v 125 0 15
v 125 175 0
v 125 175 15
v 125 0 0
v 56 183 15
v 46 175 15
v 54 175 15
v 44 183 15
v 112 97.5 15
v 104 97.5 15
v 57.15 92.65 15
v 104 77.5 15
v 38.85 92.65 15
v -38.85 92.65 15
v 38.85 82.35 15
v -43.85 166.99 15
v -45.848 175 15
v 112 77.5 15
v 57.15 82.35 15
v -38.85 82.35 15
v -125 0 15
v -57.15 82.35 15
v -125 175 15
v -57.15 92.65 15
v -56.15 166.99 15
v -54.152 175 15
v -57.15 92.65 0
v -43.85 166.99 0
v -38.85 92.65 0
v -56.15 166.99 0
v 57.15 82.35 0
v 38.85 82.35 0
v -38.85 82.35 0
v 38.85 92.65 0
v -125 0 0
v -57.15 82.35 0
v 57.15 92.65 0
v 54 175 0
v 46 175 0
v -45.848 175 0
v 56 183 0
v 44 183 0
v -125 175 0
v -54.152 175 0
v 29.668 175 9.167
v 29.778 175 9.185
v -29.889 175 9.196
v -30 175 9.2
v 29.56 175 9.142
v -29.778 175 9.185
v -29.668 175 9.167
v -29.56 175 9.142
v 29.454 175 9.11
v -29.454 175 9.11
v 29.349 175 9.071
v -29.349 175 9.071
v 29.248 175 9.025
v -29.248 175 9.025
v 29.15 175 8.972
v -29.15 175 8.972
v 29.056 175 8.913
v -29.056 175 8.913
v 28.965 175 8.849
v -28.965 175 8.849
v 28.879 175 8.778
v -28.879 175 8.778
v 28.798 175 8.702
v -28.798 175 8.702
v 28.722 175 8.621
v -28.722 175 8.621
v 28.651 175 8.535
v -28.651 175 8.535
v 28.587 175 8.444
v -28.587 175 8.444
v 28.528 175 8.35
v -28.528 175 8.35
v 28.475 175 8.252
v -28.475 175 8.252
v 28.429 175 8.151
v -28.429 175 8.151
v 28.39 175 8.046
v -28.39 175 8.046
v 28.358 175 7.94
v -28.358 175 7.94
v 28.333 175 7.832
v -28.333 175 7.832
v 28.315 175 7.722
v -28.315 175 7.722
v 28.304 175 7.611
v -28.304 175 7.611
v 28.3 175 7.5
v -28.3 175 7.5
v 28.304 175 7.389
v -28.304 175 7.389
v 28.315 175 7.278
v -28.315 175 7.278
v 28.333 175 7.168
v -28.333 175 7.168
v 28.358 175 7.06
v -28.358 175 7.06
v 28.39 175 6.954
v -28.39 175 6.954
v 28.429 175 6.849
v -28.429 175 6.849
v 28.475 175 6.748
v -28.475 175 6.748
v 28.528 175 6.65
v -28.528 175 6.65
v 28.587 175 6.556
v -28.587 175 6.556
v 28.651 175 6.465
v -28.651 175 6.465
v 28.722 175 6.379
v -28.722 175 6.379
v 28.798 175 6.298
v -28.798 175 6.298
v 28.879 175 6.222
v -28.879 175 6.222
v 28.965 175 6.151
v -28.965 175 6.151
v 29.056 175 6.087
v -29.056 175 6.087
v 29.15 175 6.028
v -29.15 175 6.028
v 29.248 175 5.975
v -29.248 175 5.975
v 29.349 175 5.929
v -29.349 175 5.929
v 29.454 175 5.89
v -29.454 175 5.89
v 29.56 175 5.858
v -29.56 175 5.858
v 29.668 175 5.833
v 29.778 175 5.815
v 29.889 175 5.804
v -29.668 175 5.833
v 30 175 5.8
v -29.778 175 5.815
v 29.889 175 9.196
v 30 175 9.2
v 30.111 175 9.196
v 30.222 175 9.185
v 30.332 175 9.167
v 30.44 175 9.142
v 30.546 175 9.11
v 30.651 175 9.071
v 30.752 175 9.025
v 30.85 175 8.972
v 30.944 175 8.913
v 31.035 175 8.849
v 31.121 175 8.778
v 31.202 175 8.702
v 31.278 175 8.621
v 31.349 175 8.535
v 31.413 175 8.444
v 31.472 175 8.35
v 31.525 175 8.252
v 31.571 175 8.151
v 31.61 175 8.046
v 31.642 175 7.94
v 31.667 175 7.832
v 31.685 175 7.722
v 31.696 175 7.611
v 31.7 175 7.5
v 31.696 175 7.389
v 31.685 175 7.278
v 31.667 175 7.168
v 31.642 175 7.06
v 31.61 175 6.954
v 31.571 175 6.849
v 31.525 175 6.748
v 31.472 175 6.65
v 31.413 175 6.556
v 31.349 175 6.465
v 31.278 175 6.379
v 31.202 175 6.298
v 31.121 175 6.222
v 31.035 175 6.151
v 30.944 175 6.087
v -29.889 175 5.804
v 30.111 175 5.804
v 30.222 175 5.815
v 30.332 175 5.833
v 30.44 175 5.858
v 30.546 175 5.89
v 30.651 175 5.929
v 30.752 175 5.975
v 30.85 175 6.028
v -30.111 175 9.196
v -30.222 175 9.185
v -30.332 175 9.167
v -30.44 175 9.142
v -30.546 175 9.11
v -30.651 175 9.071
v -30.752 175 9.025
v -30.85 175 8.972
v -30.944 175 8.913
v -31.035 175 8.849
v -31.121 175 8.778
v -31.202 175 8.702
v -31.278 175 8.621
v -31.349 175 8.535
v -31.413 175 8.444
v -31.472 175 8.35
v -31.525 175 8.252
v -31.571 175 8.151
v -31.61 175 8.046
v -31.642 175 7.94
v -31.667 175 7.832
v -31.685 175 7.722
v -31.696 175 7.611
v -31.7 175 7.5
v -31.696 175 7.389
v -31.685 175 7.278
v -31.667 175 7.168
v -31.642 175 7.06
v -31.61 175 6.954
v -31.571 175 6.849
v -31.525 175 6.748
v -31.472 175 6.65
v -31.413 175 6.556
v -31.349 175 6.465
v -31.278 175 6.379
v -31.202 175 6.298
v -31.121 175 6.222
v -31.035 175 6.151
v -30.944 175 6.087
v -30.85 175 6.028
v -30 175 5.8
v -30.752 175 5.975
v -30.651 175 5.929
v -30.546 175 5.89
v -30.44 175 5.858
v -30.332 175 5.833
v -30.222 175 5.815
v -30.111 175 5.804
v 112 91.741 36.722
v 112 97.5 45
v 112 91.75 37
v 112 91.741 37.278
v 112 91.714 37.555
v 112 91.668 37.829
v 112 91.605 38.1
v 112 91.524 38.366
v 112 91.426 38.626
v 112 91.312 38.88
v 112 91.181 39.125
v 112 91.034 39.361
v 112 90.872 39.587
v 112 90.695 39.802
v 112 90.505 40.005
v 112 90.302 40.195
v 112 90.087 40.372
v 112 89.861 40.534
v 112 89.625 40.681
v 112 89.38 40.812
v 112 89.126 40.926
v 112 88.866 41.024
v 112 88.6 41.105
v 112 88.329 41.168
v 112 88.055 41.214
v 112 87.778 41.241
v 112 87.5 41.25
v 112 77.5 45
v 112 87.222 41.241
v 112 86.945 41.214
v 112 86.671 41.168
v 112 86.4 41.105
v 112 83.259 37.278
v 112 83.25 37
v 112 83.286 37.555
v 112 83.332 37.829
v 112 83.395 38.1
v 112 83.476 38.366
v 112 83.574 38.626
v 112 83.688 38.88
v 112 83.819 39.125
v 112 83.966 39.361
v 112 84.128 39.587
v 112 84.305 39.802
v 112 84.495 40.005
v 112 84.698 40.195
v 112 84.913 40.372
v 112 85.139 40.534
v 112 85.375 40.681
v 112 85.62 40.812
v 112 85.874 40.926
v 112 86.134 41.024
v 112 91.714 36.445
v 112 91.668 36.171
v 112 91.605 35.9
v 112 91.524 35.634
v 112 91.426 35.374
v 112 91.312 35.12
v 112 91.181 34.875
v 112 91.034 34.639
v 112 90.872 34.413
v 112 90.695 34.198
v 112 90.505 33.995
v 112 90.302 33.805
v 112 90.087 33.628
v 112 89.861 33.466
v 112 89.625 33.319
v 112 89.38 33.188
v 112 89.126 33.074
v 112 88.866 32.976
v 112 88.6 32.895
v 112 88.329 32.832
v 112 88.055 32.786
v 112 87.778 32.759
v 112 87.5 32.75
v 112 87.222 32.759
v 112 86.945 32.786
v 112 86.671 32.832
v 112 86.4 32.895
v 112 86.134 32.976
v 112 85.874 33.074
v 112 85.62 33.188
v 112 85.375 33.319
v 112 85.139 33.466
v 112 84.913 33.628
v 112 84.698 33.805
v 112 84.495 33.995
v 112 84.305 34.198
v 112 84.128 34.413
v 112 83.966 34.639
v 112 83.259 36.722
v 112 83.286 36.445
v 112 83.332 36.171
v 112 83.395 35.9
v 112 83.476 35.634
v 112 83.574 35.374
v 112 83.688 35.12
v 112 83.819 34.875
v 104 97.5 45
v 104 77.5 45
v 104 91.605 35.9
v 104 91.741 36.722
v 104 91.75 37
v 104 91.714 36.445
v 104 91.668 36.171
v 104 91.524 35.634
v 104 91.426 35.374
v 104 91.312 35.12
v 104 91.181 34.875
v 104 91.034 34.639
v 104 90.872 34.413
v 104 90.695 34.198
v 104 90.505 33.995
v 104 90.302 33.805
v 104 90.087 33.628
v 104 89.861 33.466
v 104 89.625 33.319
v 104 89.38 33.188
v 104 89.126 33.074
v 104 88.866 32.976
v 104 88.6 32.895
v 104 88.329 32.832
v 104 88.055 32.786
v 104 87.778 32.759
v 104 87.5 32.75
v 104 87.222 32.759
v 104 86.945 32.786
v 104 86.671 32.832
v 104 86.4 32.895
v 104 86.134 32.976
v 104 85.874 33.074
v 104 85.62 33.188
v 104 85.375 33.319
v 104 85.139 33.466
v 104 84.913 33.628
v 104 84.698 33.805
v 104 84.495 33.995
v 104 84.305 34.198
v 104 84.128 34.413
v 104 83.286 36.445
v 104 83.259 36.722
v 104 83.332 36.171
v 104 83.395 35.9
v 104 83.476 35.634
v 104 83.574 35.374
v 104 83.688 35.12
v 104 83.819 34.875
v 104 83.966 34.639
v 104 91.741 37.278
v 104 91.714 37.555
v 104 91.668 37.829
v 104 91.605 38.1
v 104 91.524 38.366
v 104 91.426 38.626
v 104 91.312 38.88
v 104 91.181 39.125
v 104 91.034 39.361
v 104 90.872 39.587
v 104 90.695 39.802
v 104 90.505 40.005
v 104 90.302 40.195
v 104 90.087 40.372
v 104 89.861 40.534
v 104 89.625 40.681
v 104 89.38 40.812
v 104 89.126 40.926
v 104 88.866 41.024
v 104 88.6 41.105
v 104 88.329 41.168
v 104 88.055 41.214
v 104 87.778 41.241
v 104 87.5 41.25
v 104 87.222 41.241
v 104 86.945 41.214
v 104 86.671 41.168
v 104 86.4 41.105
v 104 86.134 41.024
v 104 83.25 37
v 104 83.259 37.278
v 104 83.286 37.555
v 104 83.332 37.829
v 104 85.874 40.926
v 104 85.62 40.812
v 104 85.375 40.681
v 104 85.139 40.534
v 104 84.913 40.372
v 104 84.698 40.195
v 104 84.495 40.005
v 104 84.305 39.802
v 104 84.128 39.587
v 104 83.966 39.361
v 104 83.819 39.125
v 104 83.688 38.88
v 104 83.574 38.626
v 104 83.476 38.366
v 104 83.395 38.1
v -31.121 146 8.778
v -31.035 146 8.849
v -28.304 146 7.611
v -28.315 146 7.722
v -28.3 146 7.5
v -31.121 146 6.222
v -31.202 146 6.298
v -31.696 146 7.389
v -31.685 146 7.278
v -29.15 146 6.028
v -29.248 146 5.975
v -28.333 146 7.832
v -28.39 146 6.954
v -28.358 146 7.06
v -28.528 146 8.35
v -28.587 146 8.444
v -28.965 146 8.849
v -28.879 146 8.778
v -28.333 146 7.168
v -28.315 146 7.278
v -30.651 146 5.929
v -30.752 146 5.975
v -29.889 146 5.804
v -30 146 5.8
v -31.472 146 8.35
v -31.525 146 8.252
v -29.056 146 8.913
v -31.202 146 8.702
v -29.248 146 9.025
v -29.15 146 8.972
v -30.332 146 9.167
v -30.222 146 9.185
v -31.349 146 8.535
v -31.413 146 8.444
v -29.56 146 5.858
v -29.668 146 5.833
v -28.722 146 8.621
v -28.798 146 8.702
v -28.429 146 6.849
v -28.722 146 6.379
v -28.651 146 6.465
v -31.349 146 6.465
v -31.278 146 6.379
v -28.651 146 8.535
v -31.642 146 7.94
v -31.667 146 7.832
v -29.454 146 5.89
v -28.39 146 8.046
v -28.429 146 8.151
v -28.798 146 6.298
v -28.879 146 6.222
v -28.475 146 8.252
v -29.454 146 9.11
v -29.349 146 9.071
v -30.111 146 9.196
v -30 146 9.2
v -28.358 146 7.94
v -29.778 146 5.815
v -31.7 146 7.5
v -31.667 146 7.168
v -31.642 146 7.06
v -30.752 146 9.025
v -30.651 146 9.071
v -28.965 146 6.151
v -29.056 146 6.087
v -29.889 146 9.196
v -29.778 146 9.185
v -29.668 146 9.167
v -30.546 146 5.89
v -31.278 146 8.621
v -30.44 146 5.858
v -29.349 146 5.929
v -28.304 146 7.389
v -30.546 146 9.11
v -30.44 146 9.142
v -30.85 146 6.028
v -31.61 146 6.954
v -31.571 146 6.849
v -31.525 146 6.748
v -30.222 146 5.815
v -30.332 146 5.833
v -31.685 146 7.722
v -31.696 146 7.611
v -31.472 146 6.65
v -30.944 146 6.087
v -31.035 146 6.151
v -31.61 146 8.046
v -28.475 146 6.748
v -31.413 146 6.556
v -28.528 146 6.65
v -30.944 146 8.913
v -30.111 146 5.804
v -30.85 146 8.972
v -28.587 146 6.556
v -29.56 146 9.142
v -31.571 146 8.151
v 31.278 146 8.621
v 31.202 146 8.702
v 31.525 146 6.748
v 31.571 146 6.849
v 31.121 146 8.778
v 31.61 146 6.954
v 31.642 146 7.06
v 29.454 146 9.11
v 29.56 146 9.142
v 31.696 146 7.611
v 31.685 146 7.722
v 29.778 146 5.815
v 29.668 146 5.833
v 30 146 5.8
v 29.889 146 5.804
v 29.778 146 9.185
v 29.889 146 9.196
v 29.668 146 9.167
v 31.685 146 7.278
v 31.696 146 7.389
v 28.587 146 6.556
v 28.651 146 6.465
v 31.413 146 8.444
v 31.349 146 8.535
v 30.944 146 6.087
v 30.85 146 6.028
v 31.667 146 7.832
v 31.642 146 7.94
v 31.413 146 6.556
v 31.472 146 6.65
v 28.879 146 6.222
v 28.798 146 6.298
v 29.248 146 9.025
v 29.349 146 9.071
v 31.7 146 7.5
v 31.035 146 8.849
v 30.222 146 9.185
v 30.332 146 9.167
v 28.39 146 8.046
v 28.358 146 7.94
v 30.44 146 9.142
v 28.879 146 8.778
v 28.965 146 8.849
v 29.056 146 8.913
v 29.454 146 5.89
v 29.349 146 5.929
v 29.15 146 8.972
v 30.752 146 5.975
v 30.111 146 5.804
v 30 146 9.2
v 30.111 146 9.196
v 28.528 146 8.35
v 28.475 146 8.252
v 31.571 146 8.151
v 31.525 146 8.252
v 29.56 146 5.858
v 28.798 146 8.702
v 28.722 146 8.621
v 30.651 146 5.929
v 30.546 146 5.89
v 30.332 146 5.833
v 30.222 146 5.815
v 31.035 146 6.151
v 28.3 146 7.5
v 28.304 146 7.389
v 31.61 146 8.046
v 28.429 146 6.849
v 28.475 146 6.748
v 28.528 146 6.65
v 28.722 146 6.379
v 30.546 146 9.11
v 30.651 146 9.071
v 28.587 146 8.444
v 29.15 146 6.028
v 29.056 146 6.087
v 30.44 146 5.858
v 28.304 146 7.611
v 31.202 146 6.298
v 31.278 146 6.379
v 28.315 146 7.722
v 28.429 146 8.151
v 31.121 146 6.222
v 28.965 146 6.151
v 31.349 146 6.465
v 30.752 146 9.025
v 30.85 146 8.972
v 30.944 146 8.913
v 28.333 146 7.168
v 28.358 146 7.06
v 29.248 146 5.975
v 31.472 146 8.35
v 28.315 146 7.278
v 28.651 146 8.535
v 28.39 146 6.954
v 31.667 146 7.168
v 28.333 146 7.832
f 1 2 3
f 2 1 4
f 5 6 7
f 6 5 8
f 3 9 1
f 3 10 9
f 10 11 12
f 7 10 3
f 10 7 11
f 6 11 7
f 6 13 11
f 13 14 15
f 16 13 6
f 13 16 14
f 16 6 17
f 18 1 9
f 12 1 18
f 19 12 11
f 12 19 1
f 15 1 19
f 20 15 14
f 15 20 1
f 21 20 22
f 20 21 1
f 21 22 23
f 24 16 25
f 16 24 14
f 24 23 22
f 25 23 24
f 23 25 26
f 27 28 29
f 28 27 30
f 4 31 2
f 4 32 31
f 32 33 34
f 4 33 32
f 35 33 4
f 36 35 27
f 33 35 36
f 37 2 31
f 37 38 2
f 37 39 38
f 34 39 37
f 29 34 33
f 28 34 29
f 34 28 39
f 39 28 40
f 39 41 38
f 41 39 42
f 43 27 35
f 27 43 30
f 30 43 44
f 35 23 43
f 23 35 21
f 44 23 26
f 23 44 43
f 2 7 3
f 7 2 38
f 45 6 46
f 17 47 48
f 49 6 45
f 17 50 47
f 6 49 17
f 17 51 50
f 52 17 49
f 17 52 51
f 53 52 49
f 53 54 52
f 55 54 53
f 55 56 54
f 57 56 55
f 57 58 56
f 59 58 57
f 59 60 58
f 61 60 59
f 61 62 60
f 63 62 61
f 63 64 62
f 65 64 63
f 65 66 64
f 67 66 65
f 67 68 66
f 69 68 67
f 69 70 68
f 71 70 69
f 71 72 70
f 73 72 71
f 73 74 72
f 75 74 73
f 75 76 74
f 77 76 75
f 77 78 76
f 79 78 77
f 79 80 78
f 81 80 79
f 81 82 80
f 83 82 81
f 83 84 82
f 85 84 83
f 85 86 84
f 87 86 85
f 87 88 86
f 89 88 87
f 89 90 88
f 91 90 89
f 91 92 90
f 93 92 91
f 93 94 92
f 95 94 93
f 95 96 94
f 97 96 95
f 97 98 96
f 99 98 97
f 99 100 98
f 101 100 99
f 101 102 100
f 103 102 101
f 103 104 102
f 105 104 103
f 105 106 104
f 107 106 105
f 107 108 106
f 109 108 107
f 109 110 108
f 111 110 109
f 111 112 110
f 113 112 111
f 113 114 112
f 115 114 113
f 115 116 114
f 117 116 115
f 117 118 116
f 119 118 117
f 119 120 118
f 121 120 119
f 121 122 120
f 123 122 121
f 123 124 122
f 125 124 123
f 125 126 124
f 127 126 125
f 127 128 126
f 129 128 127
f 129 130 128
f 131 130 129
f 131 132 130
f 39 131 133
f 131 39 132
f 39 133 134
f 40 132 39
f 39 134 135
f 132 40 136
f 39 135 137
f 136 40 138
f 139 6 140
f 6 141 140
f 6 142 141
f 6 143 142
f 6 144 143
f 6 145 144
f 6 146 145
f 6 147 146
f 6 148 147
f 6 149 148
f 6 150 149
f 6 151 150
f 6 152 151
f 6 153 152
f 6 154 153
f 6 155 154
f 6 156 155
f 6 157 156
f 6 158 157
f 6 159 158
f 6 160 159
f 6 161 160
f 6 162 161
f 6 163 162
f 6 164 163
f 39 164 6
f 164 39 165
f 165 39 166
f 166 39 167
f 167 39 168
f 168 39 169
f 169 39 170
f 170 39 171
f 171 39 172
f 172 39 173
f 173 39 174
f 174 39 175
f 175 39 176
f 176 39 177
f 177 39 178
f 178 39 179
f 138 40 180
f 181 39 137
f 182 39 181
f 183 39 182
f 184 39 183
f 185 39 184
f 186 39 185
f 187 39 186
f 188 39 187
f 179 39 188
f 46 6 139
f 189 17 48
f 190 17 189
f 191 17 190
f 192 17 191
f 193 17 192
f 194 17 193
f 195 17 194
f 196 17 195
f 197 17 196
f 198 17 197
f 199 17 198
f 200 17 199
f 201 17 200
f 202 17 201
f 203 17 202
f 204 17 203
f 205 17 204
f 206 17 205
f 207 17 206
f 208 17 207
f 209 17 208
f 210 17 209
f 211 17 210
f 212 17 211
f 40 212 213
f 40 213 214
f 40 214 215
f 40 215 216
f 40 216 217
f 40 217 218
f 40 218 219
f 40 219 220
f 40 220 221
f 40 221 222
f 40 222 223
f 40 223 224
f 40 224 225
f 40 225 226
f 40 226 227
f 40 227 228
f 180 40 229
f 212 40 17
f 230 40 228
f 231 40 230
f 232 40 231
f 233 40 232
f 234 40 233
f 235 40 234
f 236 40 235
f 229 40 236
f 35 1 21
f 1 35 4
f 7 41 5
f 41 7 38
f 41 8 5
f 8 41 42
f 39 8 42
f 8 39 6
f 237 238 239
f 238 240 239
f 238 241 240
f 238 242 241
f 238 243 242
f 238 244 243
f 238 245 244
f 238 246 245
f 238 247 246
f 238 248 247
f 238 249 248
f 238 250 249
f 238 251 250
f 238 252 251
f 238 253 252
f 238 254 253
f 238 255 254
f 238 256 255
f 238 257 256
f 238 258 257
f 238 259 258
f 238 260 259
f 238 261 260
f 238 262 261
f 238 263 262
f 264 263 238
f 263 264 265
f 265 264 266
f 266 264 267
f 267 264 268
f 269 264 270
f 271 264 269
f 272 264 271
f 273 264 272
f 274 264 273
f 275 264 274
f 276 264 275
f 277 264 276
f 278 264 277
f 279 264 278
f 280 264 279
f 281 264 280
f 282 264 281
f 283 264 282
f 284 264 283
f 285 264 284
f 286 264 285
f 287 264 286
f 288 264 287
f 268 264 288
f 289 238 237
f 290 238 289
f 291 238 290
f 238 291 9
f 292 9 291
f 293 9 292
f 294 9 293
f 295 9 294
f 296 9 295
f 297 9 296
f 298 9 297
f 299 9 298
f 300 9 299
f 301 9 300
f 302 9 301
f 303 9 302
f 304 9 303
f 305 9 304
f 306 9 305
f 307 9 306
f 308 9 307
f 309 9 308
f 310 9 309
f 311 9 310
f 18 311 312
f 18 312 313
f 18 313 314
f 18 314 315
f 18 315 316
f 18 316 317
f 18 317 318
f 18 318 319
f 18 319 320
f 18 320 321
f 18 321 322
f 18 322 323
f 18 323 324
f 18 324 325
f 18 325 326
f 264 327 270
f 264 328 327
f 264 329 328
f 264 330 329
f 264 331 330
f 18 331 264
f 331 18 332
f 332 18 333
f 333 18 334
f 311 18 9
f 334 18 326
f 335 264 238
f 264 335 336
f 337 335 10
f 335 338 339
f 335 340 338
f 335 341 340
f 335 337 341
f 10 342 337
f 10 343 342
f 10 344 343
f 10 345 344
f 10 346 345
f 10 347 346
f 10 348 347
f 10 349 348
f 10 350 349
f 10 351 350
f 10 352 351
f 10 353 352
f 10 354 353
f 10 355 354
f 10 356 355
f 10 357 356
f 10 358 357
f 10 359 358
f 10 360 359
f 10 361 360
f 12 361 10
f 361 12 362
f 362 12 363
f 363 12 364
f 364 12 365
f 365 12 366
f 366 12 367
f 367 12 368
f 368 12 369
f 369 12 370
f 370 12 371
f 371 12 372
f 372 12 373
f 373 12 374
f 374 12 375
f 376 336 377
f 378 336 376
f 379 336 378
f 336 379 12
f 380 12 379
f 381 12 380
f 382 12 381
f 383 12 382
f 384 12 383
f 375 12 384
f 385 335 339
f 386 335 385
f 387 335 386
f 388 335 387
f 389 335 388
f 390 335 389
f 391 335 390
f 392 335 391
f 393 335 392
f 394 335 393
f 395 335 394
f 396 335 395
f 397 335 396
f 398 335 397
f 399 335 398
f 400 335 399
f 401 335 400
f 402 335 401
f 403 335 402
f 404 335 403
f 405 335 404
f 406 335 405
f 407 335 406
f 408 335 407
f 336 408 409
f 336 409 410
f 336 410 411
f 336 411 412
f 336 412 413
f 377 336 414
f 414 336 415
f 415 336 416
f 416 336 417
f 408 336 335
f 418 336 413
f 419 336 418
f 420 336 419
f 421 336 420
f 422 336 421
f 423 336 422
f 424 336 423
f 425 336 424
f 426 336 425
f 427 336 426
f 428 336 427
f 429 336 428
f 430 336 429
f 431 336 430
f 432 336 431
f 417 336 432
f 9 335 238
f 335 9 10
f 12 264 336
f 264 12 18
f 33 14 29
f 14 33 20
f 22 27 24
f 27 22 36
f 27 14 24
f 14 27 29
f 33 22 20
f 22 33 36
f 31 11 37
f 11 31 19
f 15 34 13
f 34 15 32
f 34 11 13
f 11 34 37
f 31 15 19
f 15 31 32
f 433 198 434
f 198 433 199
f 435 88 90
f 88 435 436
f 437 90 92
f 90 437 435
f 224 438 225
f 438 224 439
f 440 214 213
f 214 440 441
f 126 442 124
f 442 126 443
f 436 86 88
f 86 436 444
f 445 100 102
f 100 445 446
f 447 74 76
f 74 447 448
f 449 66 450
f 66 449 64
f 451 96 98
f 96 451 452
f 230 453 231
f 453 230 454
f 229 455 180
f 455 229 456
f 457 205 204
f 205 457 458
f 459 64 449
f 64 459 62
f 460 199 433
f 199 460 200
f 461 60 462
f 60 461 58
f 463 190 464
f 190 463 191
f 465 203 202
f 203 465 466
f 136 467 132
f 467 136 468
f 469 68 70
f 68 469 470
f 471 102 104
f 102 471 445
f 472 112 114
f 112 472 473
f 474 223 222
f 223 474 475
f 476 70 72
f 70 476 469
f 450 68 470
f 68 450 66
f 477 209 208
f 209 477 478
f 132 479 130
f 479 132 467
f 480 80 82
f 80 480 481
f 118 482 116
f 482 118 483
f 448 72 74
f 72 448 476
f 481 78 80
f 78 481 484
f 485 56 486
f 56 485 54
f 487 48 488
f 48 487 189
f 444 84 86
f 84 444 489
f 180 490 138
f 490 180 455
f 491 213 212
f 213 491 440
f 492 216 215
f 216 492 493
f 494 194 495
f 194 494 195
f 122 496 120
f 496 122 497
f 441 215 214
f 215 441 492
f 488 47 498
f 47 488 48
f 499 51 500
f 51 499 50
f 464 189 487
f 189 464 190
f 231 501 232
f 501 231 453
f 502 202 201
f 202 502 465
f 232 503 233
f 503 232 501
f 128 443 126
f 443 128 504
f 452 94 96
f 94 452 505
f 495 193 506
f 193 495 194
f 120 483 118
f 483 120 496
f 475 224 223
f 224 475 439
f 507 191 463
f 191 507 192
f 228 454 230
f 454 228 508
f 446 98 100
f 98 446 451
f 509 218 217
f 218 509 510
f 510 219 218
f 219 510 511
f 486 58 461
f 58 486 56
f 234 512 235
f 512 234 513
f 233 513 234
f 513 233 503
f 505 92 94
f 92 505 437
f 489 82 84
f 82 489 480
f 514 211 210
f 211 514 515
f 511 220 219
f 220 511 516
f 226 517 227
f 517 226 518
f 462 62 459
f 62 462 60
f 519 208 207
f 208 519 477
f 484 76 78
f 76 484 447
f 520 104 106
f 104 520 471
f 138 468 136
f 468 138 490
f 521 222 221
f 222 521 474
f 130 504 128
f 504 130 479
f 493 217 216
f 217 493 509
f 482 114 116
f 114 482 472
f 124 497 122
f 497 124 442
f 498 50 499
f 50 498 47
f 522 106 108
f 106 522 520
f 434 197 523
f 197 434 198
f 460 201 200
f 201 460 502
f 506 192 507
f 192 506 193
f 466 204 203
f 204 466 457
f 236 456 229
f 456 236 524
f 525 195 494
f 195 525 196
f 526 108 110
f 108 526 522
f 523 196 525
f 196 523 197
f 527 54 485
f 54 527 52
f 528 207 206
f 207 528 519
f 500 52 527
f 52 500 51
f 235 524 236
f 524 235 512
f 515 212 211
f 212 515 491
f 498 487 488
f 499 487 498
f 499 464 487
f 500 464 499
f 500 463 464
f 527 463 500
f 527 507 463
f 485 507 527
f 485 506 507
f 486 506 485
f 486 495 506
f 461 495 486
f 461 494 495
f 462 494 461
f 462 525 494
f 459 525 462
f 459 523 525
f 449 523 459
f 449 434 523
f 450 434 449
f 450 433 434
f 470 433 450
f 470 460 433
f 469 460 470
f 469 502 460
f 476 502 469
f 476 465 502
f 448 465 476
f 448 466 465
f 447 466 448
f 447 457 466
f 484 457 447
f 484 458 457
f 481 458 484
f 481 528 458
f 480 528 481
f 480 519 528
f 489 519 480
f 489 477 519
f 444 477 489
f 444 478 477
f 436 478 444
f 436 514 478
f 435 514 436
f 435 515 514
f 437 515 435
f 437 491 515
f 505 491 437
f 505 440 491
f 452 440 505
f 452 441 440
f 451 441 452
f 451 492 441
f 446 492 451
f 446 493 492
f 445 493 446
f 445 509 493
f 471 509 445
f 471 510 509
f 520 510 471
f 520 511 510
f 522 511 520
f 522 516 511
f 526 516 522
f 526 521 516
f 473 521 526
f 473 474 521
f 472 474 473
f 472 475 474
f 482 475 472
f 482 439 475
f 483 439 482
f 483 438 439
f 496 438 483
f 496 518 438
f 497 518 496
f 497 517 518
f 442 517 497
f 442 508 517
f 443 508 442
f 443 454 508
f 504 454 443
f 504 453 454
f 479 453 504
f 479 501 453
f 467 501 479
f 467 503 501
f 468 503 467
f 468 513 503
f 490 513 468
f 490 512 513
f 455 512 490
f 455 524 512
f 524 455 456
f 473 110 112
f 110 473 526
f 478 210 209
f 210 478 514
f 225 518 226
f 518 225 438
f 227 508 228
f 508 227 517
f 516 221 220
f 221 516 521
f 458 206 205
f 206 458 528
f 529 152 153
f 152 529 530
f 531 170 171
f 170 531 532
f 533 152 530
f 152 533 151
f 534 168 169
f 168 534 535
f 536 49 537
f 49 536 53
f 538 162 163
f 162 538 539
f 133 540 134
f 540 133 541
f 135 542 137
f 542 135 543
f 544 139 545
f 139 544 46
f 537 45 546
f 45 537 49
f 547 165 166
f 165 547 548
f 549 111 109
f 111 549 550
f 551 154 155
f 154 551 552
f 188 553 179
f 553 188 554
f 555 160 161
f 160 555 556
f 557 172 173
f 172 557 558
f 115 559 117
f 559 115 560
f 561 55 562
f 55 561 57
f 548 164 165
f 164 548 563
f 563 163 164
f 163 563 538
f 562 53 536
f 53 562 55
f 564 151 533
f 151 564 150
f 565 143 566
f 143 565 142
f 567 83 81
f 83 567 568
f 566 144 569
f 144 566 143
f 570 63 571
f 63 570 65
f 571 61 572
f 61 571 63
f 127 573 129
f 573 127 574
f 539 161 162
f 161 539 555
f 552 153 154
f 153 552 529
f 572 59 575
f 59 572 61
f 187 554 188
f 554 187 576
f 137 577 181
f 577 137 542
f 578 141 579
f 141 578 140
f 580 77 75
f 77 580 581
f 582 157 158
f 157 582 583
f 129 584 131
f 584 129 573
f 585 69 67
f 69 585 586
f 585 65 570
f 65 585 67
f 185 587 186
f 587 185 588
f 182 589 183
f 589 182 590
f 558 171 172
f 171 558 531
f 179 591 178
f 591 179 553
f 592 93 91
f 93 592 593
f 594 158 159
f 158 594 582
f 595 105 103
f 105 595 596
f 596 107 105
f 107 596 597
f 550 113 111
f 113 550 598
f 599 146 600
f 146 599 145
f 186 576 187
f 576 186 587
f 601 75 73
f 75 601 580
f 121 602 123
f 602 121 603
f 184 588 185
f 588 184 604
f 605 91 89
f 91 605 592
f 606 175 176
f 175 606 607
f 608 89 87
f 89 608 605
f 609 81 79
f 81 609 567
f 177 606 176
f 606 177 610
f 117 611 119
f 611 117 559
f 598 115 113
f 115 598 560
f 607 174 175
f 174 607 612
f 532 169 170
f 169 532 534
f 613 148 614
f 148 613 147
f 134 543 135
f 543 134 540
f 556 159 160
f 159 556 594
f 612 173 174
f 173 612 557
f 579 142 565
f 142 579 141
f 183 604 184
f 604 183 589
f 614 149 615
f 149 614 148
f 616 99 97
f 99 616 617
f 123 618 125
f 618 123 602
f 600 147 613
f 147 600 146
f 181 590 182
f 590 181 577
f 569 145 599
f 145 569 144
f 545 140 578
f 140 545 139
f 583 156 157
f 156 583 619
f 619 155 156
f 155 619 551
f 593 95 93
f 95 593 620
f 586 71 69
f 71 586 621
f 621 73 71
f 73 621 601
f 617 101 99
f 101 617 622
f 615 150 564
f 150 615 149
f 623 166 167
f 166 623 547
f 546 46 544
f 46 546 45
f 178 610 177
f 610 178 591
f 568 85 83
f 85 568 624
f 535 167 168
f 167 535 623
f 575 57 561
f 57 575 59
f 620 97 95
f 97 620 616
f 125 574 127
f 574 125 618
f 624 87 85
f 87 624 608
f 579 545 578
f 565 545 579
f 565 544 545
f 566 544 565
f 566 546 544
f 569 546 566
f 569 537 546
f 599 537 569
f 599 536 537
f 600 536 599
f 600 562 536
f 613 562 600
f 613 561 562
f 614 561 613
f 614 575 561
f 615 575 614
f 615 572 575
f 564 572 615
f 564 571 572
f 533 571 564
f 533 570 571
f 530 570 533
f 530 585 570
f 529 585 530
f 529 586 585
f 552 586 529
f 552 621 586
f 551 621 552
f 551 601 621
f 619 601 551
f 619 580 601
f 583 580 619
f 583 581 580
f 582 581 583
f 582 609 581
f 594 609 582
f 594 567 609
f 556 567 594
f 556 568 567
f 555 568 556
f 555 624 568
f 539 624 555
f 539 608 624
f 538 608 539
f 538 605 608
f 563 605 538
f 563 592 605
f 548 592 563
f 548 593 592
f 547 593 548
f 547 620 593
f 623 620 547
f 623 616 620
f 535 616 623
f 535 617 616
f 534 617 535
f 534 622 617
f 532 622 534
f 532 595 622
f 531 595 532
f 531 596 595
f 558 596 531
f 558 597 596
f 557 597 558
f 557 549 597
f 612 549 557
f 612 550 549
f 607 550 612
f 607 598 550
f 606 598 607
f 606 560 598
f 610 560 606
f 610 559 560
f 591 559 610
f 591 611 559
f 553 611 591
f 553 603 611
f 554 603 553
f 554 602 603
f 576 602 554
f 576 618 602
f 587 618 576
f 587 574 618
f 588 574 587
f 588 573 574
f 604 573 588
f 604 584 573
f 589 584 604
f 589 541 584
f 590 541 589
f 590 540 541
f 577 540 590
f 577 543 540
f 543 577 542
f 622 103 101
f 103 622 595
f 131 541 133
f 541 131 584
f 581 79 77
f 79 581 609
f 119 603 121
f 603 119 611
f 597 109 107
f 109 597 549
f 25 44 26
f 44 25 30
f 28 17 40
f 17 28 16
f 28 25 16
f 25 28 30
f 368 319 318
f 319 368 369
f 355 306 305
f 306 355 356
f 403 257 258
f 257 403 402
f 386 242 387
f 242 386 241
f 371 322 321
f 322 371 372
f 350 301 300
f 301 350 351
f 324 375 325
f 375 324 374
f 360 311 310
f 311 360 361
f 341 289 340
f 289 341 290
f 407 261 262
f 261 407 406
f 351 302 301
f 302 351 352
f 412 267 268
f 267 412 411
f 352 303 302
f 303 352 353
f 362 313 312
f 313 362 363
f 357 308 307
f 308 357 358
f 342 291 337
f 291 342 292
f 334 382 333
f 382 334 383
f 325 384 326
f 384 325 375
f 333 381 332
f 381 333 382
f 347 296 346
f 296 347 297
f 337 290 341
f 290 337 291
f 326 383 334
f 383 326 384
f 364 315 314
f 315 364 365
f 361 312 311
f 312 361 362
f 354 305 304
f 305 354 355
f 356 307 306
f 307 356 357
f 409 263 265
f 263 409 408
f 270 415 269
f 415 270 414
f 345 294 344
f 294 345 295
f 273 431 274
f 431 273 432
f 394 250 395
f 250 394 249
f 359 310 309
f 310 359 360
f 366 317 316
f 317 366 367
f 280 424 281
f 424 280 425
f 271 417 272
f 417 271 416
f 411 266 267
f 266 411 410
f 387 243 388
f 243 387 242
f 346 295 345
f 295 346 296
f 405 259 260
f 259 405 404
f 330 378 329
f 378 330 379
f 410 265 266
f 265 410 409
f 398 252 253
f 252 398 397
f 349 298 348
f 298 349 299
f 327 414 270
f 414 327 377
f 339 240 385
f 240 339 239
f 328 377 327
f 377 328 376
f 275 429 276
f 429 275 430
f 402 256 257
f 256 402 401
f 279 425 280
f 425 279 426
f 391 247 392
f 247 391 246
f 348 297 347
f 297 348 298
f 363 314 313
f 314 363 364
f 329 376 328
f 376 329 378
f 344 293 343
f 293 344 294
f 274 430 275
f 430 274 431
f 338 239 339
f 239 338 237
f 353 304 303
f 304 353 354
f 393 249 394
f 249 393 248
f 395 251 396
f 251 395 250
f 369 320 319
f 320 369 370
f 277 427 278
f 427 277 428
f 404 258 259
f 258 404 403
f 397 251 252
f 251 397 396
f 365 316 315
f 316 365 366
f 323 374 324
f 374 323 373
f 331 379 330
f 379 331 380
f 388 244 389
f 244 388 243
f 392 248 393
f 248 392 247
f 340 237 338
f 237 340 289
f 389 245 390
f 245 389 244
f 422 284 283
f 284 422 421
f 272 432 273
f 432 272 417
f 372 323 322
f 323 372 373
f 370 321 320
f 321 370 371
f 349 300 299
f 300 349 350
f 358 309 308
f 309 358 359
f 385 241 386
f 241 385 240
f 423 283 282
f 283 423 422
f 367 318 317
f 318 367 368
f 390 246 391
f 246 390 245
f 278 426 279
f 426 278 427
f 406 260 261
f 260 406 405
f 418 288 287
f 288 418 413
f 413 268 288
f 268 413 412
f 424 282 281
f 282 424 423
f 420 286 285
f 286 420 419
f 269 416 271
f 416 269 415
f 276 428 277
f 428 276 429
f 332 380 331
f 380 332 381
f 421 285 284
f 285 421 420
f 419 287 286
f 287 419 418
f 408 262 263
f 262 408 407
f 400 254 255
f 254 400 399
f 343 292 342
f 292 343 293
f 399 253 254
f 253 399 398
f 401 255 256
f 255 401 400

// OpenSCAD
// file: ../lib/dovetail.scad
// lib/dovetail.scad
// Shared joinery modules: dovetail tenon/mortise, M3 insert boss, rounded box.
// Depends on values in params.scad (include it in the calling file).

// A dovetail tenon: a flared prism that grows wider toward its tip so it locks
// against a matching mortise when slid in along +y.
//   len   : protrusion length (along +y)
//   base_w: width at the root (x, near the part)
//   tip_w : width at the tip (x, wider -> self locking)
//   h     : height (z)
// Literal defaults keep this library self-contained under `use <>` (which does
// not import the caller's params). Callers pass explicit sizes where needed.
module dovetail_tenon(len = 8, base_w = 8, tip_w = 12, h = 10) {
    linear_extrude(height = h)
        polygon(points = [
            [-base_w/2, 0],
            [ base_w/2, 0],
            [ tip_w/2,  len],
            [-tip_w/2,  len],
        ]);
}

// Matching mortise volume (subtract this). Enlarged by tol_dovetail per side.
module dovetail_mortise(len = 8, base_w = 8, tip_w = 12, h = 10, clr = 0.15) {
    // extend slightly beyond both faces so the cut is clean
    translate([0, -0.01, -0.01])
        linear_extrude(height = h + 0.02)
            polygon(points = [
                [-(base_w/2 + clr), 0],
                [ (base_w/2 + clr), 0],
                [ (tip_w/2 + clr),  len + 0.02],
                [-(tip_w/2 + clr),  len + 0.02],
            ]);
}

// Cylindrical boss with a blind hole for a heat-set insert.
//   boss_d : outer diameter of the boss
//   boss_h : height
//   hole_d : insert press-hole diameter (params: m3_insert)
//   hole_depth : blind hole depth (0 = through)
module insert_boss(boss_d = 8, boss_h = 8, hole_d = 4.0, hole_depth = 0) {
    difference() {
        cylinder(d = boss_d, h = boss_h);
        translate([0, 0, hole_depth == 0 ? -0.01 : boss_h - hole_depth])
            cylinder(d = hole_d, h = hole_depth == 0 ? boss_h + 0.02 : hole_depth + 0.01);
    }
}

// Rounded rectangular box shell (open top) used by gondola / recesses.
module rounded_box(x, y, z, r = 2) {
    hull() {
        for (sx = [-1, 1], sy = [-1, 1])
            translate([sx * (x/2 - r), sy * (y/2 - r), 0])
                cylinder(r = r, h = z);
    }
}

// A simple rectangular slot cutter (for tabs), centered on x, open along z.
module slot(w, t, d) {
    translate([-w/2, -t/2, -0.01])
        cube([w, t, d + 0.02]);
}
// main file
// ferris/base.scad
// Base board 250 x 175 x 15. Two identical boards join on the long (250) edge
// to give the 350 x 250 footprint. The join edge carries a self-complementary
// dovetail pair (tenon @ +50, mortise @ -50) so two identical prints mate when
// one is rotated 180 deg about the join-edge midpoint, plus M3 thumbscrew holes.
// Each board also has two tower-foot slots and a crank-shaft journal bracket.

include <../params.scad>;
use <../lib/dovetail.scad>;

// board centred in X, y from 0..base_y, join edge at y = base_y
join_y   = base_y;
foot_y   = base_y / 2;        // slot position (one tower per board)
brk_h    = 45;                // crank journal bracket height
brk_x    = 112;              // bracket wall position (stays inside x=125)

module base_board() {
    difference() {
        union() {
            translate([-base_x/2, 0, 0]) cube([base_x, base_y, base_t]);
            // join-edge dovetail tenon @ +50
            translate([50, join_y, 0]) dovetail_tenon(h = base_t);
            // crank-shaft journal bracket (one side; the shaft exits here to the crank)
            translate([brk_x - wall_frame, foot_y - crank_boss_d/2, 0])
                cube([8, crank_boss_d, brk_h]);
        }
        // join-edge dovetail mortise @ -50 (cut into -y)
        translate([-50, join_y, 0]) rotate([0, 0, 180]) dovetail_mortise(h = base_t);
        // two tower-foot slots
        for (sx = [-1, 1])
            translate([sx * 48, foot_y, base_t - base_slot_d + 0.01])
                translate([-base_slot_w/2, -base_slot_t/2, 0])
                    cube([base_slot_w, base_slot_t, base_slot_d]);
        // M3 thumbscrew holes across the seam (symmetric pair)
        for (sx = [-1, 1])
            translate([sx * 30, join_y + 1, base_t/2]) rotate([90, 0, 0])
                cylinder(d = m3_clear, h = 30);
        // crank shaft pass-through in the journal bracket (Ø8.5)
        translate([brk_x - 12, foot_y, brk_h - 8]) rotate([0, 90, 0])
            cylinder(d = crank_bearing_d, h = 16);
    }
}

base_board();
